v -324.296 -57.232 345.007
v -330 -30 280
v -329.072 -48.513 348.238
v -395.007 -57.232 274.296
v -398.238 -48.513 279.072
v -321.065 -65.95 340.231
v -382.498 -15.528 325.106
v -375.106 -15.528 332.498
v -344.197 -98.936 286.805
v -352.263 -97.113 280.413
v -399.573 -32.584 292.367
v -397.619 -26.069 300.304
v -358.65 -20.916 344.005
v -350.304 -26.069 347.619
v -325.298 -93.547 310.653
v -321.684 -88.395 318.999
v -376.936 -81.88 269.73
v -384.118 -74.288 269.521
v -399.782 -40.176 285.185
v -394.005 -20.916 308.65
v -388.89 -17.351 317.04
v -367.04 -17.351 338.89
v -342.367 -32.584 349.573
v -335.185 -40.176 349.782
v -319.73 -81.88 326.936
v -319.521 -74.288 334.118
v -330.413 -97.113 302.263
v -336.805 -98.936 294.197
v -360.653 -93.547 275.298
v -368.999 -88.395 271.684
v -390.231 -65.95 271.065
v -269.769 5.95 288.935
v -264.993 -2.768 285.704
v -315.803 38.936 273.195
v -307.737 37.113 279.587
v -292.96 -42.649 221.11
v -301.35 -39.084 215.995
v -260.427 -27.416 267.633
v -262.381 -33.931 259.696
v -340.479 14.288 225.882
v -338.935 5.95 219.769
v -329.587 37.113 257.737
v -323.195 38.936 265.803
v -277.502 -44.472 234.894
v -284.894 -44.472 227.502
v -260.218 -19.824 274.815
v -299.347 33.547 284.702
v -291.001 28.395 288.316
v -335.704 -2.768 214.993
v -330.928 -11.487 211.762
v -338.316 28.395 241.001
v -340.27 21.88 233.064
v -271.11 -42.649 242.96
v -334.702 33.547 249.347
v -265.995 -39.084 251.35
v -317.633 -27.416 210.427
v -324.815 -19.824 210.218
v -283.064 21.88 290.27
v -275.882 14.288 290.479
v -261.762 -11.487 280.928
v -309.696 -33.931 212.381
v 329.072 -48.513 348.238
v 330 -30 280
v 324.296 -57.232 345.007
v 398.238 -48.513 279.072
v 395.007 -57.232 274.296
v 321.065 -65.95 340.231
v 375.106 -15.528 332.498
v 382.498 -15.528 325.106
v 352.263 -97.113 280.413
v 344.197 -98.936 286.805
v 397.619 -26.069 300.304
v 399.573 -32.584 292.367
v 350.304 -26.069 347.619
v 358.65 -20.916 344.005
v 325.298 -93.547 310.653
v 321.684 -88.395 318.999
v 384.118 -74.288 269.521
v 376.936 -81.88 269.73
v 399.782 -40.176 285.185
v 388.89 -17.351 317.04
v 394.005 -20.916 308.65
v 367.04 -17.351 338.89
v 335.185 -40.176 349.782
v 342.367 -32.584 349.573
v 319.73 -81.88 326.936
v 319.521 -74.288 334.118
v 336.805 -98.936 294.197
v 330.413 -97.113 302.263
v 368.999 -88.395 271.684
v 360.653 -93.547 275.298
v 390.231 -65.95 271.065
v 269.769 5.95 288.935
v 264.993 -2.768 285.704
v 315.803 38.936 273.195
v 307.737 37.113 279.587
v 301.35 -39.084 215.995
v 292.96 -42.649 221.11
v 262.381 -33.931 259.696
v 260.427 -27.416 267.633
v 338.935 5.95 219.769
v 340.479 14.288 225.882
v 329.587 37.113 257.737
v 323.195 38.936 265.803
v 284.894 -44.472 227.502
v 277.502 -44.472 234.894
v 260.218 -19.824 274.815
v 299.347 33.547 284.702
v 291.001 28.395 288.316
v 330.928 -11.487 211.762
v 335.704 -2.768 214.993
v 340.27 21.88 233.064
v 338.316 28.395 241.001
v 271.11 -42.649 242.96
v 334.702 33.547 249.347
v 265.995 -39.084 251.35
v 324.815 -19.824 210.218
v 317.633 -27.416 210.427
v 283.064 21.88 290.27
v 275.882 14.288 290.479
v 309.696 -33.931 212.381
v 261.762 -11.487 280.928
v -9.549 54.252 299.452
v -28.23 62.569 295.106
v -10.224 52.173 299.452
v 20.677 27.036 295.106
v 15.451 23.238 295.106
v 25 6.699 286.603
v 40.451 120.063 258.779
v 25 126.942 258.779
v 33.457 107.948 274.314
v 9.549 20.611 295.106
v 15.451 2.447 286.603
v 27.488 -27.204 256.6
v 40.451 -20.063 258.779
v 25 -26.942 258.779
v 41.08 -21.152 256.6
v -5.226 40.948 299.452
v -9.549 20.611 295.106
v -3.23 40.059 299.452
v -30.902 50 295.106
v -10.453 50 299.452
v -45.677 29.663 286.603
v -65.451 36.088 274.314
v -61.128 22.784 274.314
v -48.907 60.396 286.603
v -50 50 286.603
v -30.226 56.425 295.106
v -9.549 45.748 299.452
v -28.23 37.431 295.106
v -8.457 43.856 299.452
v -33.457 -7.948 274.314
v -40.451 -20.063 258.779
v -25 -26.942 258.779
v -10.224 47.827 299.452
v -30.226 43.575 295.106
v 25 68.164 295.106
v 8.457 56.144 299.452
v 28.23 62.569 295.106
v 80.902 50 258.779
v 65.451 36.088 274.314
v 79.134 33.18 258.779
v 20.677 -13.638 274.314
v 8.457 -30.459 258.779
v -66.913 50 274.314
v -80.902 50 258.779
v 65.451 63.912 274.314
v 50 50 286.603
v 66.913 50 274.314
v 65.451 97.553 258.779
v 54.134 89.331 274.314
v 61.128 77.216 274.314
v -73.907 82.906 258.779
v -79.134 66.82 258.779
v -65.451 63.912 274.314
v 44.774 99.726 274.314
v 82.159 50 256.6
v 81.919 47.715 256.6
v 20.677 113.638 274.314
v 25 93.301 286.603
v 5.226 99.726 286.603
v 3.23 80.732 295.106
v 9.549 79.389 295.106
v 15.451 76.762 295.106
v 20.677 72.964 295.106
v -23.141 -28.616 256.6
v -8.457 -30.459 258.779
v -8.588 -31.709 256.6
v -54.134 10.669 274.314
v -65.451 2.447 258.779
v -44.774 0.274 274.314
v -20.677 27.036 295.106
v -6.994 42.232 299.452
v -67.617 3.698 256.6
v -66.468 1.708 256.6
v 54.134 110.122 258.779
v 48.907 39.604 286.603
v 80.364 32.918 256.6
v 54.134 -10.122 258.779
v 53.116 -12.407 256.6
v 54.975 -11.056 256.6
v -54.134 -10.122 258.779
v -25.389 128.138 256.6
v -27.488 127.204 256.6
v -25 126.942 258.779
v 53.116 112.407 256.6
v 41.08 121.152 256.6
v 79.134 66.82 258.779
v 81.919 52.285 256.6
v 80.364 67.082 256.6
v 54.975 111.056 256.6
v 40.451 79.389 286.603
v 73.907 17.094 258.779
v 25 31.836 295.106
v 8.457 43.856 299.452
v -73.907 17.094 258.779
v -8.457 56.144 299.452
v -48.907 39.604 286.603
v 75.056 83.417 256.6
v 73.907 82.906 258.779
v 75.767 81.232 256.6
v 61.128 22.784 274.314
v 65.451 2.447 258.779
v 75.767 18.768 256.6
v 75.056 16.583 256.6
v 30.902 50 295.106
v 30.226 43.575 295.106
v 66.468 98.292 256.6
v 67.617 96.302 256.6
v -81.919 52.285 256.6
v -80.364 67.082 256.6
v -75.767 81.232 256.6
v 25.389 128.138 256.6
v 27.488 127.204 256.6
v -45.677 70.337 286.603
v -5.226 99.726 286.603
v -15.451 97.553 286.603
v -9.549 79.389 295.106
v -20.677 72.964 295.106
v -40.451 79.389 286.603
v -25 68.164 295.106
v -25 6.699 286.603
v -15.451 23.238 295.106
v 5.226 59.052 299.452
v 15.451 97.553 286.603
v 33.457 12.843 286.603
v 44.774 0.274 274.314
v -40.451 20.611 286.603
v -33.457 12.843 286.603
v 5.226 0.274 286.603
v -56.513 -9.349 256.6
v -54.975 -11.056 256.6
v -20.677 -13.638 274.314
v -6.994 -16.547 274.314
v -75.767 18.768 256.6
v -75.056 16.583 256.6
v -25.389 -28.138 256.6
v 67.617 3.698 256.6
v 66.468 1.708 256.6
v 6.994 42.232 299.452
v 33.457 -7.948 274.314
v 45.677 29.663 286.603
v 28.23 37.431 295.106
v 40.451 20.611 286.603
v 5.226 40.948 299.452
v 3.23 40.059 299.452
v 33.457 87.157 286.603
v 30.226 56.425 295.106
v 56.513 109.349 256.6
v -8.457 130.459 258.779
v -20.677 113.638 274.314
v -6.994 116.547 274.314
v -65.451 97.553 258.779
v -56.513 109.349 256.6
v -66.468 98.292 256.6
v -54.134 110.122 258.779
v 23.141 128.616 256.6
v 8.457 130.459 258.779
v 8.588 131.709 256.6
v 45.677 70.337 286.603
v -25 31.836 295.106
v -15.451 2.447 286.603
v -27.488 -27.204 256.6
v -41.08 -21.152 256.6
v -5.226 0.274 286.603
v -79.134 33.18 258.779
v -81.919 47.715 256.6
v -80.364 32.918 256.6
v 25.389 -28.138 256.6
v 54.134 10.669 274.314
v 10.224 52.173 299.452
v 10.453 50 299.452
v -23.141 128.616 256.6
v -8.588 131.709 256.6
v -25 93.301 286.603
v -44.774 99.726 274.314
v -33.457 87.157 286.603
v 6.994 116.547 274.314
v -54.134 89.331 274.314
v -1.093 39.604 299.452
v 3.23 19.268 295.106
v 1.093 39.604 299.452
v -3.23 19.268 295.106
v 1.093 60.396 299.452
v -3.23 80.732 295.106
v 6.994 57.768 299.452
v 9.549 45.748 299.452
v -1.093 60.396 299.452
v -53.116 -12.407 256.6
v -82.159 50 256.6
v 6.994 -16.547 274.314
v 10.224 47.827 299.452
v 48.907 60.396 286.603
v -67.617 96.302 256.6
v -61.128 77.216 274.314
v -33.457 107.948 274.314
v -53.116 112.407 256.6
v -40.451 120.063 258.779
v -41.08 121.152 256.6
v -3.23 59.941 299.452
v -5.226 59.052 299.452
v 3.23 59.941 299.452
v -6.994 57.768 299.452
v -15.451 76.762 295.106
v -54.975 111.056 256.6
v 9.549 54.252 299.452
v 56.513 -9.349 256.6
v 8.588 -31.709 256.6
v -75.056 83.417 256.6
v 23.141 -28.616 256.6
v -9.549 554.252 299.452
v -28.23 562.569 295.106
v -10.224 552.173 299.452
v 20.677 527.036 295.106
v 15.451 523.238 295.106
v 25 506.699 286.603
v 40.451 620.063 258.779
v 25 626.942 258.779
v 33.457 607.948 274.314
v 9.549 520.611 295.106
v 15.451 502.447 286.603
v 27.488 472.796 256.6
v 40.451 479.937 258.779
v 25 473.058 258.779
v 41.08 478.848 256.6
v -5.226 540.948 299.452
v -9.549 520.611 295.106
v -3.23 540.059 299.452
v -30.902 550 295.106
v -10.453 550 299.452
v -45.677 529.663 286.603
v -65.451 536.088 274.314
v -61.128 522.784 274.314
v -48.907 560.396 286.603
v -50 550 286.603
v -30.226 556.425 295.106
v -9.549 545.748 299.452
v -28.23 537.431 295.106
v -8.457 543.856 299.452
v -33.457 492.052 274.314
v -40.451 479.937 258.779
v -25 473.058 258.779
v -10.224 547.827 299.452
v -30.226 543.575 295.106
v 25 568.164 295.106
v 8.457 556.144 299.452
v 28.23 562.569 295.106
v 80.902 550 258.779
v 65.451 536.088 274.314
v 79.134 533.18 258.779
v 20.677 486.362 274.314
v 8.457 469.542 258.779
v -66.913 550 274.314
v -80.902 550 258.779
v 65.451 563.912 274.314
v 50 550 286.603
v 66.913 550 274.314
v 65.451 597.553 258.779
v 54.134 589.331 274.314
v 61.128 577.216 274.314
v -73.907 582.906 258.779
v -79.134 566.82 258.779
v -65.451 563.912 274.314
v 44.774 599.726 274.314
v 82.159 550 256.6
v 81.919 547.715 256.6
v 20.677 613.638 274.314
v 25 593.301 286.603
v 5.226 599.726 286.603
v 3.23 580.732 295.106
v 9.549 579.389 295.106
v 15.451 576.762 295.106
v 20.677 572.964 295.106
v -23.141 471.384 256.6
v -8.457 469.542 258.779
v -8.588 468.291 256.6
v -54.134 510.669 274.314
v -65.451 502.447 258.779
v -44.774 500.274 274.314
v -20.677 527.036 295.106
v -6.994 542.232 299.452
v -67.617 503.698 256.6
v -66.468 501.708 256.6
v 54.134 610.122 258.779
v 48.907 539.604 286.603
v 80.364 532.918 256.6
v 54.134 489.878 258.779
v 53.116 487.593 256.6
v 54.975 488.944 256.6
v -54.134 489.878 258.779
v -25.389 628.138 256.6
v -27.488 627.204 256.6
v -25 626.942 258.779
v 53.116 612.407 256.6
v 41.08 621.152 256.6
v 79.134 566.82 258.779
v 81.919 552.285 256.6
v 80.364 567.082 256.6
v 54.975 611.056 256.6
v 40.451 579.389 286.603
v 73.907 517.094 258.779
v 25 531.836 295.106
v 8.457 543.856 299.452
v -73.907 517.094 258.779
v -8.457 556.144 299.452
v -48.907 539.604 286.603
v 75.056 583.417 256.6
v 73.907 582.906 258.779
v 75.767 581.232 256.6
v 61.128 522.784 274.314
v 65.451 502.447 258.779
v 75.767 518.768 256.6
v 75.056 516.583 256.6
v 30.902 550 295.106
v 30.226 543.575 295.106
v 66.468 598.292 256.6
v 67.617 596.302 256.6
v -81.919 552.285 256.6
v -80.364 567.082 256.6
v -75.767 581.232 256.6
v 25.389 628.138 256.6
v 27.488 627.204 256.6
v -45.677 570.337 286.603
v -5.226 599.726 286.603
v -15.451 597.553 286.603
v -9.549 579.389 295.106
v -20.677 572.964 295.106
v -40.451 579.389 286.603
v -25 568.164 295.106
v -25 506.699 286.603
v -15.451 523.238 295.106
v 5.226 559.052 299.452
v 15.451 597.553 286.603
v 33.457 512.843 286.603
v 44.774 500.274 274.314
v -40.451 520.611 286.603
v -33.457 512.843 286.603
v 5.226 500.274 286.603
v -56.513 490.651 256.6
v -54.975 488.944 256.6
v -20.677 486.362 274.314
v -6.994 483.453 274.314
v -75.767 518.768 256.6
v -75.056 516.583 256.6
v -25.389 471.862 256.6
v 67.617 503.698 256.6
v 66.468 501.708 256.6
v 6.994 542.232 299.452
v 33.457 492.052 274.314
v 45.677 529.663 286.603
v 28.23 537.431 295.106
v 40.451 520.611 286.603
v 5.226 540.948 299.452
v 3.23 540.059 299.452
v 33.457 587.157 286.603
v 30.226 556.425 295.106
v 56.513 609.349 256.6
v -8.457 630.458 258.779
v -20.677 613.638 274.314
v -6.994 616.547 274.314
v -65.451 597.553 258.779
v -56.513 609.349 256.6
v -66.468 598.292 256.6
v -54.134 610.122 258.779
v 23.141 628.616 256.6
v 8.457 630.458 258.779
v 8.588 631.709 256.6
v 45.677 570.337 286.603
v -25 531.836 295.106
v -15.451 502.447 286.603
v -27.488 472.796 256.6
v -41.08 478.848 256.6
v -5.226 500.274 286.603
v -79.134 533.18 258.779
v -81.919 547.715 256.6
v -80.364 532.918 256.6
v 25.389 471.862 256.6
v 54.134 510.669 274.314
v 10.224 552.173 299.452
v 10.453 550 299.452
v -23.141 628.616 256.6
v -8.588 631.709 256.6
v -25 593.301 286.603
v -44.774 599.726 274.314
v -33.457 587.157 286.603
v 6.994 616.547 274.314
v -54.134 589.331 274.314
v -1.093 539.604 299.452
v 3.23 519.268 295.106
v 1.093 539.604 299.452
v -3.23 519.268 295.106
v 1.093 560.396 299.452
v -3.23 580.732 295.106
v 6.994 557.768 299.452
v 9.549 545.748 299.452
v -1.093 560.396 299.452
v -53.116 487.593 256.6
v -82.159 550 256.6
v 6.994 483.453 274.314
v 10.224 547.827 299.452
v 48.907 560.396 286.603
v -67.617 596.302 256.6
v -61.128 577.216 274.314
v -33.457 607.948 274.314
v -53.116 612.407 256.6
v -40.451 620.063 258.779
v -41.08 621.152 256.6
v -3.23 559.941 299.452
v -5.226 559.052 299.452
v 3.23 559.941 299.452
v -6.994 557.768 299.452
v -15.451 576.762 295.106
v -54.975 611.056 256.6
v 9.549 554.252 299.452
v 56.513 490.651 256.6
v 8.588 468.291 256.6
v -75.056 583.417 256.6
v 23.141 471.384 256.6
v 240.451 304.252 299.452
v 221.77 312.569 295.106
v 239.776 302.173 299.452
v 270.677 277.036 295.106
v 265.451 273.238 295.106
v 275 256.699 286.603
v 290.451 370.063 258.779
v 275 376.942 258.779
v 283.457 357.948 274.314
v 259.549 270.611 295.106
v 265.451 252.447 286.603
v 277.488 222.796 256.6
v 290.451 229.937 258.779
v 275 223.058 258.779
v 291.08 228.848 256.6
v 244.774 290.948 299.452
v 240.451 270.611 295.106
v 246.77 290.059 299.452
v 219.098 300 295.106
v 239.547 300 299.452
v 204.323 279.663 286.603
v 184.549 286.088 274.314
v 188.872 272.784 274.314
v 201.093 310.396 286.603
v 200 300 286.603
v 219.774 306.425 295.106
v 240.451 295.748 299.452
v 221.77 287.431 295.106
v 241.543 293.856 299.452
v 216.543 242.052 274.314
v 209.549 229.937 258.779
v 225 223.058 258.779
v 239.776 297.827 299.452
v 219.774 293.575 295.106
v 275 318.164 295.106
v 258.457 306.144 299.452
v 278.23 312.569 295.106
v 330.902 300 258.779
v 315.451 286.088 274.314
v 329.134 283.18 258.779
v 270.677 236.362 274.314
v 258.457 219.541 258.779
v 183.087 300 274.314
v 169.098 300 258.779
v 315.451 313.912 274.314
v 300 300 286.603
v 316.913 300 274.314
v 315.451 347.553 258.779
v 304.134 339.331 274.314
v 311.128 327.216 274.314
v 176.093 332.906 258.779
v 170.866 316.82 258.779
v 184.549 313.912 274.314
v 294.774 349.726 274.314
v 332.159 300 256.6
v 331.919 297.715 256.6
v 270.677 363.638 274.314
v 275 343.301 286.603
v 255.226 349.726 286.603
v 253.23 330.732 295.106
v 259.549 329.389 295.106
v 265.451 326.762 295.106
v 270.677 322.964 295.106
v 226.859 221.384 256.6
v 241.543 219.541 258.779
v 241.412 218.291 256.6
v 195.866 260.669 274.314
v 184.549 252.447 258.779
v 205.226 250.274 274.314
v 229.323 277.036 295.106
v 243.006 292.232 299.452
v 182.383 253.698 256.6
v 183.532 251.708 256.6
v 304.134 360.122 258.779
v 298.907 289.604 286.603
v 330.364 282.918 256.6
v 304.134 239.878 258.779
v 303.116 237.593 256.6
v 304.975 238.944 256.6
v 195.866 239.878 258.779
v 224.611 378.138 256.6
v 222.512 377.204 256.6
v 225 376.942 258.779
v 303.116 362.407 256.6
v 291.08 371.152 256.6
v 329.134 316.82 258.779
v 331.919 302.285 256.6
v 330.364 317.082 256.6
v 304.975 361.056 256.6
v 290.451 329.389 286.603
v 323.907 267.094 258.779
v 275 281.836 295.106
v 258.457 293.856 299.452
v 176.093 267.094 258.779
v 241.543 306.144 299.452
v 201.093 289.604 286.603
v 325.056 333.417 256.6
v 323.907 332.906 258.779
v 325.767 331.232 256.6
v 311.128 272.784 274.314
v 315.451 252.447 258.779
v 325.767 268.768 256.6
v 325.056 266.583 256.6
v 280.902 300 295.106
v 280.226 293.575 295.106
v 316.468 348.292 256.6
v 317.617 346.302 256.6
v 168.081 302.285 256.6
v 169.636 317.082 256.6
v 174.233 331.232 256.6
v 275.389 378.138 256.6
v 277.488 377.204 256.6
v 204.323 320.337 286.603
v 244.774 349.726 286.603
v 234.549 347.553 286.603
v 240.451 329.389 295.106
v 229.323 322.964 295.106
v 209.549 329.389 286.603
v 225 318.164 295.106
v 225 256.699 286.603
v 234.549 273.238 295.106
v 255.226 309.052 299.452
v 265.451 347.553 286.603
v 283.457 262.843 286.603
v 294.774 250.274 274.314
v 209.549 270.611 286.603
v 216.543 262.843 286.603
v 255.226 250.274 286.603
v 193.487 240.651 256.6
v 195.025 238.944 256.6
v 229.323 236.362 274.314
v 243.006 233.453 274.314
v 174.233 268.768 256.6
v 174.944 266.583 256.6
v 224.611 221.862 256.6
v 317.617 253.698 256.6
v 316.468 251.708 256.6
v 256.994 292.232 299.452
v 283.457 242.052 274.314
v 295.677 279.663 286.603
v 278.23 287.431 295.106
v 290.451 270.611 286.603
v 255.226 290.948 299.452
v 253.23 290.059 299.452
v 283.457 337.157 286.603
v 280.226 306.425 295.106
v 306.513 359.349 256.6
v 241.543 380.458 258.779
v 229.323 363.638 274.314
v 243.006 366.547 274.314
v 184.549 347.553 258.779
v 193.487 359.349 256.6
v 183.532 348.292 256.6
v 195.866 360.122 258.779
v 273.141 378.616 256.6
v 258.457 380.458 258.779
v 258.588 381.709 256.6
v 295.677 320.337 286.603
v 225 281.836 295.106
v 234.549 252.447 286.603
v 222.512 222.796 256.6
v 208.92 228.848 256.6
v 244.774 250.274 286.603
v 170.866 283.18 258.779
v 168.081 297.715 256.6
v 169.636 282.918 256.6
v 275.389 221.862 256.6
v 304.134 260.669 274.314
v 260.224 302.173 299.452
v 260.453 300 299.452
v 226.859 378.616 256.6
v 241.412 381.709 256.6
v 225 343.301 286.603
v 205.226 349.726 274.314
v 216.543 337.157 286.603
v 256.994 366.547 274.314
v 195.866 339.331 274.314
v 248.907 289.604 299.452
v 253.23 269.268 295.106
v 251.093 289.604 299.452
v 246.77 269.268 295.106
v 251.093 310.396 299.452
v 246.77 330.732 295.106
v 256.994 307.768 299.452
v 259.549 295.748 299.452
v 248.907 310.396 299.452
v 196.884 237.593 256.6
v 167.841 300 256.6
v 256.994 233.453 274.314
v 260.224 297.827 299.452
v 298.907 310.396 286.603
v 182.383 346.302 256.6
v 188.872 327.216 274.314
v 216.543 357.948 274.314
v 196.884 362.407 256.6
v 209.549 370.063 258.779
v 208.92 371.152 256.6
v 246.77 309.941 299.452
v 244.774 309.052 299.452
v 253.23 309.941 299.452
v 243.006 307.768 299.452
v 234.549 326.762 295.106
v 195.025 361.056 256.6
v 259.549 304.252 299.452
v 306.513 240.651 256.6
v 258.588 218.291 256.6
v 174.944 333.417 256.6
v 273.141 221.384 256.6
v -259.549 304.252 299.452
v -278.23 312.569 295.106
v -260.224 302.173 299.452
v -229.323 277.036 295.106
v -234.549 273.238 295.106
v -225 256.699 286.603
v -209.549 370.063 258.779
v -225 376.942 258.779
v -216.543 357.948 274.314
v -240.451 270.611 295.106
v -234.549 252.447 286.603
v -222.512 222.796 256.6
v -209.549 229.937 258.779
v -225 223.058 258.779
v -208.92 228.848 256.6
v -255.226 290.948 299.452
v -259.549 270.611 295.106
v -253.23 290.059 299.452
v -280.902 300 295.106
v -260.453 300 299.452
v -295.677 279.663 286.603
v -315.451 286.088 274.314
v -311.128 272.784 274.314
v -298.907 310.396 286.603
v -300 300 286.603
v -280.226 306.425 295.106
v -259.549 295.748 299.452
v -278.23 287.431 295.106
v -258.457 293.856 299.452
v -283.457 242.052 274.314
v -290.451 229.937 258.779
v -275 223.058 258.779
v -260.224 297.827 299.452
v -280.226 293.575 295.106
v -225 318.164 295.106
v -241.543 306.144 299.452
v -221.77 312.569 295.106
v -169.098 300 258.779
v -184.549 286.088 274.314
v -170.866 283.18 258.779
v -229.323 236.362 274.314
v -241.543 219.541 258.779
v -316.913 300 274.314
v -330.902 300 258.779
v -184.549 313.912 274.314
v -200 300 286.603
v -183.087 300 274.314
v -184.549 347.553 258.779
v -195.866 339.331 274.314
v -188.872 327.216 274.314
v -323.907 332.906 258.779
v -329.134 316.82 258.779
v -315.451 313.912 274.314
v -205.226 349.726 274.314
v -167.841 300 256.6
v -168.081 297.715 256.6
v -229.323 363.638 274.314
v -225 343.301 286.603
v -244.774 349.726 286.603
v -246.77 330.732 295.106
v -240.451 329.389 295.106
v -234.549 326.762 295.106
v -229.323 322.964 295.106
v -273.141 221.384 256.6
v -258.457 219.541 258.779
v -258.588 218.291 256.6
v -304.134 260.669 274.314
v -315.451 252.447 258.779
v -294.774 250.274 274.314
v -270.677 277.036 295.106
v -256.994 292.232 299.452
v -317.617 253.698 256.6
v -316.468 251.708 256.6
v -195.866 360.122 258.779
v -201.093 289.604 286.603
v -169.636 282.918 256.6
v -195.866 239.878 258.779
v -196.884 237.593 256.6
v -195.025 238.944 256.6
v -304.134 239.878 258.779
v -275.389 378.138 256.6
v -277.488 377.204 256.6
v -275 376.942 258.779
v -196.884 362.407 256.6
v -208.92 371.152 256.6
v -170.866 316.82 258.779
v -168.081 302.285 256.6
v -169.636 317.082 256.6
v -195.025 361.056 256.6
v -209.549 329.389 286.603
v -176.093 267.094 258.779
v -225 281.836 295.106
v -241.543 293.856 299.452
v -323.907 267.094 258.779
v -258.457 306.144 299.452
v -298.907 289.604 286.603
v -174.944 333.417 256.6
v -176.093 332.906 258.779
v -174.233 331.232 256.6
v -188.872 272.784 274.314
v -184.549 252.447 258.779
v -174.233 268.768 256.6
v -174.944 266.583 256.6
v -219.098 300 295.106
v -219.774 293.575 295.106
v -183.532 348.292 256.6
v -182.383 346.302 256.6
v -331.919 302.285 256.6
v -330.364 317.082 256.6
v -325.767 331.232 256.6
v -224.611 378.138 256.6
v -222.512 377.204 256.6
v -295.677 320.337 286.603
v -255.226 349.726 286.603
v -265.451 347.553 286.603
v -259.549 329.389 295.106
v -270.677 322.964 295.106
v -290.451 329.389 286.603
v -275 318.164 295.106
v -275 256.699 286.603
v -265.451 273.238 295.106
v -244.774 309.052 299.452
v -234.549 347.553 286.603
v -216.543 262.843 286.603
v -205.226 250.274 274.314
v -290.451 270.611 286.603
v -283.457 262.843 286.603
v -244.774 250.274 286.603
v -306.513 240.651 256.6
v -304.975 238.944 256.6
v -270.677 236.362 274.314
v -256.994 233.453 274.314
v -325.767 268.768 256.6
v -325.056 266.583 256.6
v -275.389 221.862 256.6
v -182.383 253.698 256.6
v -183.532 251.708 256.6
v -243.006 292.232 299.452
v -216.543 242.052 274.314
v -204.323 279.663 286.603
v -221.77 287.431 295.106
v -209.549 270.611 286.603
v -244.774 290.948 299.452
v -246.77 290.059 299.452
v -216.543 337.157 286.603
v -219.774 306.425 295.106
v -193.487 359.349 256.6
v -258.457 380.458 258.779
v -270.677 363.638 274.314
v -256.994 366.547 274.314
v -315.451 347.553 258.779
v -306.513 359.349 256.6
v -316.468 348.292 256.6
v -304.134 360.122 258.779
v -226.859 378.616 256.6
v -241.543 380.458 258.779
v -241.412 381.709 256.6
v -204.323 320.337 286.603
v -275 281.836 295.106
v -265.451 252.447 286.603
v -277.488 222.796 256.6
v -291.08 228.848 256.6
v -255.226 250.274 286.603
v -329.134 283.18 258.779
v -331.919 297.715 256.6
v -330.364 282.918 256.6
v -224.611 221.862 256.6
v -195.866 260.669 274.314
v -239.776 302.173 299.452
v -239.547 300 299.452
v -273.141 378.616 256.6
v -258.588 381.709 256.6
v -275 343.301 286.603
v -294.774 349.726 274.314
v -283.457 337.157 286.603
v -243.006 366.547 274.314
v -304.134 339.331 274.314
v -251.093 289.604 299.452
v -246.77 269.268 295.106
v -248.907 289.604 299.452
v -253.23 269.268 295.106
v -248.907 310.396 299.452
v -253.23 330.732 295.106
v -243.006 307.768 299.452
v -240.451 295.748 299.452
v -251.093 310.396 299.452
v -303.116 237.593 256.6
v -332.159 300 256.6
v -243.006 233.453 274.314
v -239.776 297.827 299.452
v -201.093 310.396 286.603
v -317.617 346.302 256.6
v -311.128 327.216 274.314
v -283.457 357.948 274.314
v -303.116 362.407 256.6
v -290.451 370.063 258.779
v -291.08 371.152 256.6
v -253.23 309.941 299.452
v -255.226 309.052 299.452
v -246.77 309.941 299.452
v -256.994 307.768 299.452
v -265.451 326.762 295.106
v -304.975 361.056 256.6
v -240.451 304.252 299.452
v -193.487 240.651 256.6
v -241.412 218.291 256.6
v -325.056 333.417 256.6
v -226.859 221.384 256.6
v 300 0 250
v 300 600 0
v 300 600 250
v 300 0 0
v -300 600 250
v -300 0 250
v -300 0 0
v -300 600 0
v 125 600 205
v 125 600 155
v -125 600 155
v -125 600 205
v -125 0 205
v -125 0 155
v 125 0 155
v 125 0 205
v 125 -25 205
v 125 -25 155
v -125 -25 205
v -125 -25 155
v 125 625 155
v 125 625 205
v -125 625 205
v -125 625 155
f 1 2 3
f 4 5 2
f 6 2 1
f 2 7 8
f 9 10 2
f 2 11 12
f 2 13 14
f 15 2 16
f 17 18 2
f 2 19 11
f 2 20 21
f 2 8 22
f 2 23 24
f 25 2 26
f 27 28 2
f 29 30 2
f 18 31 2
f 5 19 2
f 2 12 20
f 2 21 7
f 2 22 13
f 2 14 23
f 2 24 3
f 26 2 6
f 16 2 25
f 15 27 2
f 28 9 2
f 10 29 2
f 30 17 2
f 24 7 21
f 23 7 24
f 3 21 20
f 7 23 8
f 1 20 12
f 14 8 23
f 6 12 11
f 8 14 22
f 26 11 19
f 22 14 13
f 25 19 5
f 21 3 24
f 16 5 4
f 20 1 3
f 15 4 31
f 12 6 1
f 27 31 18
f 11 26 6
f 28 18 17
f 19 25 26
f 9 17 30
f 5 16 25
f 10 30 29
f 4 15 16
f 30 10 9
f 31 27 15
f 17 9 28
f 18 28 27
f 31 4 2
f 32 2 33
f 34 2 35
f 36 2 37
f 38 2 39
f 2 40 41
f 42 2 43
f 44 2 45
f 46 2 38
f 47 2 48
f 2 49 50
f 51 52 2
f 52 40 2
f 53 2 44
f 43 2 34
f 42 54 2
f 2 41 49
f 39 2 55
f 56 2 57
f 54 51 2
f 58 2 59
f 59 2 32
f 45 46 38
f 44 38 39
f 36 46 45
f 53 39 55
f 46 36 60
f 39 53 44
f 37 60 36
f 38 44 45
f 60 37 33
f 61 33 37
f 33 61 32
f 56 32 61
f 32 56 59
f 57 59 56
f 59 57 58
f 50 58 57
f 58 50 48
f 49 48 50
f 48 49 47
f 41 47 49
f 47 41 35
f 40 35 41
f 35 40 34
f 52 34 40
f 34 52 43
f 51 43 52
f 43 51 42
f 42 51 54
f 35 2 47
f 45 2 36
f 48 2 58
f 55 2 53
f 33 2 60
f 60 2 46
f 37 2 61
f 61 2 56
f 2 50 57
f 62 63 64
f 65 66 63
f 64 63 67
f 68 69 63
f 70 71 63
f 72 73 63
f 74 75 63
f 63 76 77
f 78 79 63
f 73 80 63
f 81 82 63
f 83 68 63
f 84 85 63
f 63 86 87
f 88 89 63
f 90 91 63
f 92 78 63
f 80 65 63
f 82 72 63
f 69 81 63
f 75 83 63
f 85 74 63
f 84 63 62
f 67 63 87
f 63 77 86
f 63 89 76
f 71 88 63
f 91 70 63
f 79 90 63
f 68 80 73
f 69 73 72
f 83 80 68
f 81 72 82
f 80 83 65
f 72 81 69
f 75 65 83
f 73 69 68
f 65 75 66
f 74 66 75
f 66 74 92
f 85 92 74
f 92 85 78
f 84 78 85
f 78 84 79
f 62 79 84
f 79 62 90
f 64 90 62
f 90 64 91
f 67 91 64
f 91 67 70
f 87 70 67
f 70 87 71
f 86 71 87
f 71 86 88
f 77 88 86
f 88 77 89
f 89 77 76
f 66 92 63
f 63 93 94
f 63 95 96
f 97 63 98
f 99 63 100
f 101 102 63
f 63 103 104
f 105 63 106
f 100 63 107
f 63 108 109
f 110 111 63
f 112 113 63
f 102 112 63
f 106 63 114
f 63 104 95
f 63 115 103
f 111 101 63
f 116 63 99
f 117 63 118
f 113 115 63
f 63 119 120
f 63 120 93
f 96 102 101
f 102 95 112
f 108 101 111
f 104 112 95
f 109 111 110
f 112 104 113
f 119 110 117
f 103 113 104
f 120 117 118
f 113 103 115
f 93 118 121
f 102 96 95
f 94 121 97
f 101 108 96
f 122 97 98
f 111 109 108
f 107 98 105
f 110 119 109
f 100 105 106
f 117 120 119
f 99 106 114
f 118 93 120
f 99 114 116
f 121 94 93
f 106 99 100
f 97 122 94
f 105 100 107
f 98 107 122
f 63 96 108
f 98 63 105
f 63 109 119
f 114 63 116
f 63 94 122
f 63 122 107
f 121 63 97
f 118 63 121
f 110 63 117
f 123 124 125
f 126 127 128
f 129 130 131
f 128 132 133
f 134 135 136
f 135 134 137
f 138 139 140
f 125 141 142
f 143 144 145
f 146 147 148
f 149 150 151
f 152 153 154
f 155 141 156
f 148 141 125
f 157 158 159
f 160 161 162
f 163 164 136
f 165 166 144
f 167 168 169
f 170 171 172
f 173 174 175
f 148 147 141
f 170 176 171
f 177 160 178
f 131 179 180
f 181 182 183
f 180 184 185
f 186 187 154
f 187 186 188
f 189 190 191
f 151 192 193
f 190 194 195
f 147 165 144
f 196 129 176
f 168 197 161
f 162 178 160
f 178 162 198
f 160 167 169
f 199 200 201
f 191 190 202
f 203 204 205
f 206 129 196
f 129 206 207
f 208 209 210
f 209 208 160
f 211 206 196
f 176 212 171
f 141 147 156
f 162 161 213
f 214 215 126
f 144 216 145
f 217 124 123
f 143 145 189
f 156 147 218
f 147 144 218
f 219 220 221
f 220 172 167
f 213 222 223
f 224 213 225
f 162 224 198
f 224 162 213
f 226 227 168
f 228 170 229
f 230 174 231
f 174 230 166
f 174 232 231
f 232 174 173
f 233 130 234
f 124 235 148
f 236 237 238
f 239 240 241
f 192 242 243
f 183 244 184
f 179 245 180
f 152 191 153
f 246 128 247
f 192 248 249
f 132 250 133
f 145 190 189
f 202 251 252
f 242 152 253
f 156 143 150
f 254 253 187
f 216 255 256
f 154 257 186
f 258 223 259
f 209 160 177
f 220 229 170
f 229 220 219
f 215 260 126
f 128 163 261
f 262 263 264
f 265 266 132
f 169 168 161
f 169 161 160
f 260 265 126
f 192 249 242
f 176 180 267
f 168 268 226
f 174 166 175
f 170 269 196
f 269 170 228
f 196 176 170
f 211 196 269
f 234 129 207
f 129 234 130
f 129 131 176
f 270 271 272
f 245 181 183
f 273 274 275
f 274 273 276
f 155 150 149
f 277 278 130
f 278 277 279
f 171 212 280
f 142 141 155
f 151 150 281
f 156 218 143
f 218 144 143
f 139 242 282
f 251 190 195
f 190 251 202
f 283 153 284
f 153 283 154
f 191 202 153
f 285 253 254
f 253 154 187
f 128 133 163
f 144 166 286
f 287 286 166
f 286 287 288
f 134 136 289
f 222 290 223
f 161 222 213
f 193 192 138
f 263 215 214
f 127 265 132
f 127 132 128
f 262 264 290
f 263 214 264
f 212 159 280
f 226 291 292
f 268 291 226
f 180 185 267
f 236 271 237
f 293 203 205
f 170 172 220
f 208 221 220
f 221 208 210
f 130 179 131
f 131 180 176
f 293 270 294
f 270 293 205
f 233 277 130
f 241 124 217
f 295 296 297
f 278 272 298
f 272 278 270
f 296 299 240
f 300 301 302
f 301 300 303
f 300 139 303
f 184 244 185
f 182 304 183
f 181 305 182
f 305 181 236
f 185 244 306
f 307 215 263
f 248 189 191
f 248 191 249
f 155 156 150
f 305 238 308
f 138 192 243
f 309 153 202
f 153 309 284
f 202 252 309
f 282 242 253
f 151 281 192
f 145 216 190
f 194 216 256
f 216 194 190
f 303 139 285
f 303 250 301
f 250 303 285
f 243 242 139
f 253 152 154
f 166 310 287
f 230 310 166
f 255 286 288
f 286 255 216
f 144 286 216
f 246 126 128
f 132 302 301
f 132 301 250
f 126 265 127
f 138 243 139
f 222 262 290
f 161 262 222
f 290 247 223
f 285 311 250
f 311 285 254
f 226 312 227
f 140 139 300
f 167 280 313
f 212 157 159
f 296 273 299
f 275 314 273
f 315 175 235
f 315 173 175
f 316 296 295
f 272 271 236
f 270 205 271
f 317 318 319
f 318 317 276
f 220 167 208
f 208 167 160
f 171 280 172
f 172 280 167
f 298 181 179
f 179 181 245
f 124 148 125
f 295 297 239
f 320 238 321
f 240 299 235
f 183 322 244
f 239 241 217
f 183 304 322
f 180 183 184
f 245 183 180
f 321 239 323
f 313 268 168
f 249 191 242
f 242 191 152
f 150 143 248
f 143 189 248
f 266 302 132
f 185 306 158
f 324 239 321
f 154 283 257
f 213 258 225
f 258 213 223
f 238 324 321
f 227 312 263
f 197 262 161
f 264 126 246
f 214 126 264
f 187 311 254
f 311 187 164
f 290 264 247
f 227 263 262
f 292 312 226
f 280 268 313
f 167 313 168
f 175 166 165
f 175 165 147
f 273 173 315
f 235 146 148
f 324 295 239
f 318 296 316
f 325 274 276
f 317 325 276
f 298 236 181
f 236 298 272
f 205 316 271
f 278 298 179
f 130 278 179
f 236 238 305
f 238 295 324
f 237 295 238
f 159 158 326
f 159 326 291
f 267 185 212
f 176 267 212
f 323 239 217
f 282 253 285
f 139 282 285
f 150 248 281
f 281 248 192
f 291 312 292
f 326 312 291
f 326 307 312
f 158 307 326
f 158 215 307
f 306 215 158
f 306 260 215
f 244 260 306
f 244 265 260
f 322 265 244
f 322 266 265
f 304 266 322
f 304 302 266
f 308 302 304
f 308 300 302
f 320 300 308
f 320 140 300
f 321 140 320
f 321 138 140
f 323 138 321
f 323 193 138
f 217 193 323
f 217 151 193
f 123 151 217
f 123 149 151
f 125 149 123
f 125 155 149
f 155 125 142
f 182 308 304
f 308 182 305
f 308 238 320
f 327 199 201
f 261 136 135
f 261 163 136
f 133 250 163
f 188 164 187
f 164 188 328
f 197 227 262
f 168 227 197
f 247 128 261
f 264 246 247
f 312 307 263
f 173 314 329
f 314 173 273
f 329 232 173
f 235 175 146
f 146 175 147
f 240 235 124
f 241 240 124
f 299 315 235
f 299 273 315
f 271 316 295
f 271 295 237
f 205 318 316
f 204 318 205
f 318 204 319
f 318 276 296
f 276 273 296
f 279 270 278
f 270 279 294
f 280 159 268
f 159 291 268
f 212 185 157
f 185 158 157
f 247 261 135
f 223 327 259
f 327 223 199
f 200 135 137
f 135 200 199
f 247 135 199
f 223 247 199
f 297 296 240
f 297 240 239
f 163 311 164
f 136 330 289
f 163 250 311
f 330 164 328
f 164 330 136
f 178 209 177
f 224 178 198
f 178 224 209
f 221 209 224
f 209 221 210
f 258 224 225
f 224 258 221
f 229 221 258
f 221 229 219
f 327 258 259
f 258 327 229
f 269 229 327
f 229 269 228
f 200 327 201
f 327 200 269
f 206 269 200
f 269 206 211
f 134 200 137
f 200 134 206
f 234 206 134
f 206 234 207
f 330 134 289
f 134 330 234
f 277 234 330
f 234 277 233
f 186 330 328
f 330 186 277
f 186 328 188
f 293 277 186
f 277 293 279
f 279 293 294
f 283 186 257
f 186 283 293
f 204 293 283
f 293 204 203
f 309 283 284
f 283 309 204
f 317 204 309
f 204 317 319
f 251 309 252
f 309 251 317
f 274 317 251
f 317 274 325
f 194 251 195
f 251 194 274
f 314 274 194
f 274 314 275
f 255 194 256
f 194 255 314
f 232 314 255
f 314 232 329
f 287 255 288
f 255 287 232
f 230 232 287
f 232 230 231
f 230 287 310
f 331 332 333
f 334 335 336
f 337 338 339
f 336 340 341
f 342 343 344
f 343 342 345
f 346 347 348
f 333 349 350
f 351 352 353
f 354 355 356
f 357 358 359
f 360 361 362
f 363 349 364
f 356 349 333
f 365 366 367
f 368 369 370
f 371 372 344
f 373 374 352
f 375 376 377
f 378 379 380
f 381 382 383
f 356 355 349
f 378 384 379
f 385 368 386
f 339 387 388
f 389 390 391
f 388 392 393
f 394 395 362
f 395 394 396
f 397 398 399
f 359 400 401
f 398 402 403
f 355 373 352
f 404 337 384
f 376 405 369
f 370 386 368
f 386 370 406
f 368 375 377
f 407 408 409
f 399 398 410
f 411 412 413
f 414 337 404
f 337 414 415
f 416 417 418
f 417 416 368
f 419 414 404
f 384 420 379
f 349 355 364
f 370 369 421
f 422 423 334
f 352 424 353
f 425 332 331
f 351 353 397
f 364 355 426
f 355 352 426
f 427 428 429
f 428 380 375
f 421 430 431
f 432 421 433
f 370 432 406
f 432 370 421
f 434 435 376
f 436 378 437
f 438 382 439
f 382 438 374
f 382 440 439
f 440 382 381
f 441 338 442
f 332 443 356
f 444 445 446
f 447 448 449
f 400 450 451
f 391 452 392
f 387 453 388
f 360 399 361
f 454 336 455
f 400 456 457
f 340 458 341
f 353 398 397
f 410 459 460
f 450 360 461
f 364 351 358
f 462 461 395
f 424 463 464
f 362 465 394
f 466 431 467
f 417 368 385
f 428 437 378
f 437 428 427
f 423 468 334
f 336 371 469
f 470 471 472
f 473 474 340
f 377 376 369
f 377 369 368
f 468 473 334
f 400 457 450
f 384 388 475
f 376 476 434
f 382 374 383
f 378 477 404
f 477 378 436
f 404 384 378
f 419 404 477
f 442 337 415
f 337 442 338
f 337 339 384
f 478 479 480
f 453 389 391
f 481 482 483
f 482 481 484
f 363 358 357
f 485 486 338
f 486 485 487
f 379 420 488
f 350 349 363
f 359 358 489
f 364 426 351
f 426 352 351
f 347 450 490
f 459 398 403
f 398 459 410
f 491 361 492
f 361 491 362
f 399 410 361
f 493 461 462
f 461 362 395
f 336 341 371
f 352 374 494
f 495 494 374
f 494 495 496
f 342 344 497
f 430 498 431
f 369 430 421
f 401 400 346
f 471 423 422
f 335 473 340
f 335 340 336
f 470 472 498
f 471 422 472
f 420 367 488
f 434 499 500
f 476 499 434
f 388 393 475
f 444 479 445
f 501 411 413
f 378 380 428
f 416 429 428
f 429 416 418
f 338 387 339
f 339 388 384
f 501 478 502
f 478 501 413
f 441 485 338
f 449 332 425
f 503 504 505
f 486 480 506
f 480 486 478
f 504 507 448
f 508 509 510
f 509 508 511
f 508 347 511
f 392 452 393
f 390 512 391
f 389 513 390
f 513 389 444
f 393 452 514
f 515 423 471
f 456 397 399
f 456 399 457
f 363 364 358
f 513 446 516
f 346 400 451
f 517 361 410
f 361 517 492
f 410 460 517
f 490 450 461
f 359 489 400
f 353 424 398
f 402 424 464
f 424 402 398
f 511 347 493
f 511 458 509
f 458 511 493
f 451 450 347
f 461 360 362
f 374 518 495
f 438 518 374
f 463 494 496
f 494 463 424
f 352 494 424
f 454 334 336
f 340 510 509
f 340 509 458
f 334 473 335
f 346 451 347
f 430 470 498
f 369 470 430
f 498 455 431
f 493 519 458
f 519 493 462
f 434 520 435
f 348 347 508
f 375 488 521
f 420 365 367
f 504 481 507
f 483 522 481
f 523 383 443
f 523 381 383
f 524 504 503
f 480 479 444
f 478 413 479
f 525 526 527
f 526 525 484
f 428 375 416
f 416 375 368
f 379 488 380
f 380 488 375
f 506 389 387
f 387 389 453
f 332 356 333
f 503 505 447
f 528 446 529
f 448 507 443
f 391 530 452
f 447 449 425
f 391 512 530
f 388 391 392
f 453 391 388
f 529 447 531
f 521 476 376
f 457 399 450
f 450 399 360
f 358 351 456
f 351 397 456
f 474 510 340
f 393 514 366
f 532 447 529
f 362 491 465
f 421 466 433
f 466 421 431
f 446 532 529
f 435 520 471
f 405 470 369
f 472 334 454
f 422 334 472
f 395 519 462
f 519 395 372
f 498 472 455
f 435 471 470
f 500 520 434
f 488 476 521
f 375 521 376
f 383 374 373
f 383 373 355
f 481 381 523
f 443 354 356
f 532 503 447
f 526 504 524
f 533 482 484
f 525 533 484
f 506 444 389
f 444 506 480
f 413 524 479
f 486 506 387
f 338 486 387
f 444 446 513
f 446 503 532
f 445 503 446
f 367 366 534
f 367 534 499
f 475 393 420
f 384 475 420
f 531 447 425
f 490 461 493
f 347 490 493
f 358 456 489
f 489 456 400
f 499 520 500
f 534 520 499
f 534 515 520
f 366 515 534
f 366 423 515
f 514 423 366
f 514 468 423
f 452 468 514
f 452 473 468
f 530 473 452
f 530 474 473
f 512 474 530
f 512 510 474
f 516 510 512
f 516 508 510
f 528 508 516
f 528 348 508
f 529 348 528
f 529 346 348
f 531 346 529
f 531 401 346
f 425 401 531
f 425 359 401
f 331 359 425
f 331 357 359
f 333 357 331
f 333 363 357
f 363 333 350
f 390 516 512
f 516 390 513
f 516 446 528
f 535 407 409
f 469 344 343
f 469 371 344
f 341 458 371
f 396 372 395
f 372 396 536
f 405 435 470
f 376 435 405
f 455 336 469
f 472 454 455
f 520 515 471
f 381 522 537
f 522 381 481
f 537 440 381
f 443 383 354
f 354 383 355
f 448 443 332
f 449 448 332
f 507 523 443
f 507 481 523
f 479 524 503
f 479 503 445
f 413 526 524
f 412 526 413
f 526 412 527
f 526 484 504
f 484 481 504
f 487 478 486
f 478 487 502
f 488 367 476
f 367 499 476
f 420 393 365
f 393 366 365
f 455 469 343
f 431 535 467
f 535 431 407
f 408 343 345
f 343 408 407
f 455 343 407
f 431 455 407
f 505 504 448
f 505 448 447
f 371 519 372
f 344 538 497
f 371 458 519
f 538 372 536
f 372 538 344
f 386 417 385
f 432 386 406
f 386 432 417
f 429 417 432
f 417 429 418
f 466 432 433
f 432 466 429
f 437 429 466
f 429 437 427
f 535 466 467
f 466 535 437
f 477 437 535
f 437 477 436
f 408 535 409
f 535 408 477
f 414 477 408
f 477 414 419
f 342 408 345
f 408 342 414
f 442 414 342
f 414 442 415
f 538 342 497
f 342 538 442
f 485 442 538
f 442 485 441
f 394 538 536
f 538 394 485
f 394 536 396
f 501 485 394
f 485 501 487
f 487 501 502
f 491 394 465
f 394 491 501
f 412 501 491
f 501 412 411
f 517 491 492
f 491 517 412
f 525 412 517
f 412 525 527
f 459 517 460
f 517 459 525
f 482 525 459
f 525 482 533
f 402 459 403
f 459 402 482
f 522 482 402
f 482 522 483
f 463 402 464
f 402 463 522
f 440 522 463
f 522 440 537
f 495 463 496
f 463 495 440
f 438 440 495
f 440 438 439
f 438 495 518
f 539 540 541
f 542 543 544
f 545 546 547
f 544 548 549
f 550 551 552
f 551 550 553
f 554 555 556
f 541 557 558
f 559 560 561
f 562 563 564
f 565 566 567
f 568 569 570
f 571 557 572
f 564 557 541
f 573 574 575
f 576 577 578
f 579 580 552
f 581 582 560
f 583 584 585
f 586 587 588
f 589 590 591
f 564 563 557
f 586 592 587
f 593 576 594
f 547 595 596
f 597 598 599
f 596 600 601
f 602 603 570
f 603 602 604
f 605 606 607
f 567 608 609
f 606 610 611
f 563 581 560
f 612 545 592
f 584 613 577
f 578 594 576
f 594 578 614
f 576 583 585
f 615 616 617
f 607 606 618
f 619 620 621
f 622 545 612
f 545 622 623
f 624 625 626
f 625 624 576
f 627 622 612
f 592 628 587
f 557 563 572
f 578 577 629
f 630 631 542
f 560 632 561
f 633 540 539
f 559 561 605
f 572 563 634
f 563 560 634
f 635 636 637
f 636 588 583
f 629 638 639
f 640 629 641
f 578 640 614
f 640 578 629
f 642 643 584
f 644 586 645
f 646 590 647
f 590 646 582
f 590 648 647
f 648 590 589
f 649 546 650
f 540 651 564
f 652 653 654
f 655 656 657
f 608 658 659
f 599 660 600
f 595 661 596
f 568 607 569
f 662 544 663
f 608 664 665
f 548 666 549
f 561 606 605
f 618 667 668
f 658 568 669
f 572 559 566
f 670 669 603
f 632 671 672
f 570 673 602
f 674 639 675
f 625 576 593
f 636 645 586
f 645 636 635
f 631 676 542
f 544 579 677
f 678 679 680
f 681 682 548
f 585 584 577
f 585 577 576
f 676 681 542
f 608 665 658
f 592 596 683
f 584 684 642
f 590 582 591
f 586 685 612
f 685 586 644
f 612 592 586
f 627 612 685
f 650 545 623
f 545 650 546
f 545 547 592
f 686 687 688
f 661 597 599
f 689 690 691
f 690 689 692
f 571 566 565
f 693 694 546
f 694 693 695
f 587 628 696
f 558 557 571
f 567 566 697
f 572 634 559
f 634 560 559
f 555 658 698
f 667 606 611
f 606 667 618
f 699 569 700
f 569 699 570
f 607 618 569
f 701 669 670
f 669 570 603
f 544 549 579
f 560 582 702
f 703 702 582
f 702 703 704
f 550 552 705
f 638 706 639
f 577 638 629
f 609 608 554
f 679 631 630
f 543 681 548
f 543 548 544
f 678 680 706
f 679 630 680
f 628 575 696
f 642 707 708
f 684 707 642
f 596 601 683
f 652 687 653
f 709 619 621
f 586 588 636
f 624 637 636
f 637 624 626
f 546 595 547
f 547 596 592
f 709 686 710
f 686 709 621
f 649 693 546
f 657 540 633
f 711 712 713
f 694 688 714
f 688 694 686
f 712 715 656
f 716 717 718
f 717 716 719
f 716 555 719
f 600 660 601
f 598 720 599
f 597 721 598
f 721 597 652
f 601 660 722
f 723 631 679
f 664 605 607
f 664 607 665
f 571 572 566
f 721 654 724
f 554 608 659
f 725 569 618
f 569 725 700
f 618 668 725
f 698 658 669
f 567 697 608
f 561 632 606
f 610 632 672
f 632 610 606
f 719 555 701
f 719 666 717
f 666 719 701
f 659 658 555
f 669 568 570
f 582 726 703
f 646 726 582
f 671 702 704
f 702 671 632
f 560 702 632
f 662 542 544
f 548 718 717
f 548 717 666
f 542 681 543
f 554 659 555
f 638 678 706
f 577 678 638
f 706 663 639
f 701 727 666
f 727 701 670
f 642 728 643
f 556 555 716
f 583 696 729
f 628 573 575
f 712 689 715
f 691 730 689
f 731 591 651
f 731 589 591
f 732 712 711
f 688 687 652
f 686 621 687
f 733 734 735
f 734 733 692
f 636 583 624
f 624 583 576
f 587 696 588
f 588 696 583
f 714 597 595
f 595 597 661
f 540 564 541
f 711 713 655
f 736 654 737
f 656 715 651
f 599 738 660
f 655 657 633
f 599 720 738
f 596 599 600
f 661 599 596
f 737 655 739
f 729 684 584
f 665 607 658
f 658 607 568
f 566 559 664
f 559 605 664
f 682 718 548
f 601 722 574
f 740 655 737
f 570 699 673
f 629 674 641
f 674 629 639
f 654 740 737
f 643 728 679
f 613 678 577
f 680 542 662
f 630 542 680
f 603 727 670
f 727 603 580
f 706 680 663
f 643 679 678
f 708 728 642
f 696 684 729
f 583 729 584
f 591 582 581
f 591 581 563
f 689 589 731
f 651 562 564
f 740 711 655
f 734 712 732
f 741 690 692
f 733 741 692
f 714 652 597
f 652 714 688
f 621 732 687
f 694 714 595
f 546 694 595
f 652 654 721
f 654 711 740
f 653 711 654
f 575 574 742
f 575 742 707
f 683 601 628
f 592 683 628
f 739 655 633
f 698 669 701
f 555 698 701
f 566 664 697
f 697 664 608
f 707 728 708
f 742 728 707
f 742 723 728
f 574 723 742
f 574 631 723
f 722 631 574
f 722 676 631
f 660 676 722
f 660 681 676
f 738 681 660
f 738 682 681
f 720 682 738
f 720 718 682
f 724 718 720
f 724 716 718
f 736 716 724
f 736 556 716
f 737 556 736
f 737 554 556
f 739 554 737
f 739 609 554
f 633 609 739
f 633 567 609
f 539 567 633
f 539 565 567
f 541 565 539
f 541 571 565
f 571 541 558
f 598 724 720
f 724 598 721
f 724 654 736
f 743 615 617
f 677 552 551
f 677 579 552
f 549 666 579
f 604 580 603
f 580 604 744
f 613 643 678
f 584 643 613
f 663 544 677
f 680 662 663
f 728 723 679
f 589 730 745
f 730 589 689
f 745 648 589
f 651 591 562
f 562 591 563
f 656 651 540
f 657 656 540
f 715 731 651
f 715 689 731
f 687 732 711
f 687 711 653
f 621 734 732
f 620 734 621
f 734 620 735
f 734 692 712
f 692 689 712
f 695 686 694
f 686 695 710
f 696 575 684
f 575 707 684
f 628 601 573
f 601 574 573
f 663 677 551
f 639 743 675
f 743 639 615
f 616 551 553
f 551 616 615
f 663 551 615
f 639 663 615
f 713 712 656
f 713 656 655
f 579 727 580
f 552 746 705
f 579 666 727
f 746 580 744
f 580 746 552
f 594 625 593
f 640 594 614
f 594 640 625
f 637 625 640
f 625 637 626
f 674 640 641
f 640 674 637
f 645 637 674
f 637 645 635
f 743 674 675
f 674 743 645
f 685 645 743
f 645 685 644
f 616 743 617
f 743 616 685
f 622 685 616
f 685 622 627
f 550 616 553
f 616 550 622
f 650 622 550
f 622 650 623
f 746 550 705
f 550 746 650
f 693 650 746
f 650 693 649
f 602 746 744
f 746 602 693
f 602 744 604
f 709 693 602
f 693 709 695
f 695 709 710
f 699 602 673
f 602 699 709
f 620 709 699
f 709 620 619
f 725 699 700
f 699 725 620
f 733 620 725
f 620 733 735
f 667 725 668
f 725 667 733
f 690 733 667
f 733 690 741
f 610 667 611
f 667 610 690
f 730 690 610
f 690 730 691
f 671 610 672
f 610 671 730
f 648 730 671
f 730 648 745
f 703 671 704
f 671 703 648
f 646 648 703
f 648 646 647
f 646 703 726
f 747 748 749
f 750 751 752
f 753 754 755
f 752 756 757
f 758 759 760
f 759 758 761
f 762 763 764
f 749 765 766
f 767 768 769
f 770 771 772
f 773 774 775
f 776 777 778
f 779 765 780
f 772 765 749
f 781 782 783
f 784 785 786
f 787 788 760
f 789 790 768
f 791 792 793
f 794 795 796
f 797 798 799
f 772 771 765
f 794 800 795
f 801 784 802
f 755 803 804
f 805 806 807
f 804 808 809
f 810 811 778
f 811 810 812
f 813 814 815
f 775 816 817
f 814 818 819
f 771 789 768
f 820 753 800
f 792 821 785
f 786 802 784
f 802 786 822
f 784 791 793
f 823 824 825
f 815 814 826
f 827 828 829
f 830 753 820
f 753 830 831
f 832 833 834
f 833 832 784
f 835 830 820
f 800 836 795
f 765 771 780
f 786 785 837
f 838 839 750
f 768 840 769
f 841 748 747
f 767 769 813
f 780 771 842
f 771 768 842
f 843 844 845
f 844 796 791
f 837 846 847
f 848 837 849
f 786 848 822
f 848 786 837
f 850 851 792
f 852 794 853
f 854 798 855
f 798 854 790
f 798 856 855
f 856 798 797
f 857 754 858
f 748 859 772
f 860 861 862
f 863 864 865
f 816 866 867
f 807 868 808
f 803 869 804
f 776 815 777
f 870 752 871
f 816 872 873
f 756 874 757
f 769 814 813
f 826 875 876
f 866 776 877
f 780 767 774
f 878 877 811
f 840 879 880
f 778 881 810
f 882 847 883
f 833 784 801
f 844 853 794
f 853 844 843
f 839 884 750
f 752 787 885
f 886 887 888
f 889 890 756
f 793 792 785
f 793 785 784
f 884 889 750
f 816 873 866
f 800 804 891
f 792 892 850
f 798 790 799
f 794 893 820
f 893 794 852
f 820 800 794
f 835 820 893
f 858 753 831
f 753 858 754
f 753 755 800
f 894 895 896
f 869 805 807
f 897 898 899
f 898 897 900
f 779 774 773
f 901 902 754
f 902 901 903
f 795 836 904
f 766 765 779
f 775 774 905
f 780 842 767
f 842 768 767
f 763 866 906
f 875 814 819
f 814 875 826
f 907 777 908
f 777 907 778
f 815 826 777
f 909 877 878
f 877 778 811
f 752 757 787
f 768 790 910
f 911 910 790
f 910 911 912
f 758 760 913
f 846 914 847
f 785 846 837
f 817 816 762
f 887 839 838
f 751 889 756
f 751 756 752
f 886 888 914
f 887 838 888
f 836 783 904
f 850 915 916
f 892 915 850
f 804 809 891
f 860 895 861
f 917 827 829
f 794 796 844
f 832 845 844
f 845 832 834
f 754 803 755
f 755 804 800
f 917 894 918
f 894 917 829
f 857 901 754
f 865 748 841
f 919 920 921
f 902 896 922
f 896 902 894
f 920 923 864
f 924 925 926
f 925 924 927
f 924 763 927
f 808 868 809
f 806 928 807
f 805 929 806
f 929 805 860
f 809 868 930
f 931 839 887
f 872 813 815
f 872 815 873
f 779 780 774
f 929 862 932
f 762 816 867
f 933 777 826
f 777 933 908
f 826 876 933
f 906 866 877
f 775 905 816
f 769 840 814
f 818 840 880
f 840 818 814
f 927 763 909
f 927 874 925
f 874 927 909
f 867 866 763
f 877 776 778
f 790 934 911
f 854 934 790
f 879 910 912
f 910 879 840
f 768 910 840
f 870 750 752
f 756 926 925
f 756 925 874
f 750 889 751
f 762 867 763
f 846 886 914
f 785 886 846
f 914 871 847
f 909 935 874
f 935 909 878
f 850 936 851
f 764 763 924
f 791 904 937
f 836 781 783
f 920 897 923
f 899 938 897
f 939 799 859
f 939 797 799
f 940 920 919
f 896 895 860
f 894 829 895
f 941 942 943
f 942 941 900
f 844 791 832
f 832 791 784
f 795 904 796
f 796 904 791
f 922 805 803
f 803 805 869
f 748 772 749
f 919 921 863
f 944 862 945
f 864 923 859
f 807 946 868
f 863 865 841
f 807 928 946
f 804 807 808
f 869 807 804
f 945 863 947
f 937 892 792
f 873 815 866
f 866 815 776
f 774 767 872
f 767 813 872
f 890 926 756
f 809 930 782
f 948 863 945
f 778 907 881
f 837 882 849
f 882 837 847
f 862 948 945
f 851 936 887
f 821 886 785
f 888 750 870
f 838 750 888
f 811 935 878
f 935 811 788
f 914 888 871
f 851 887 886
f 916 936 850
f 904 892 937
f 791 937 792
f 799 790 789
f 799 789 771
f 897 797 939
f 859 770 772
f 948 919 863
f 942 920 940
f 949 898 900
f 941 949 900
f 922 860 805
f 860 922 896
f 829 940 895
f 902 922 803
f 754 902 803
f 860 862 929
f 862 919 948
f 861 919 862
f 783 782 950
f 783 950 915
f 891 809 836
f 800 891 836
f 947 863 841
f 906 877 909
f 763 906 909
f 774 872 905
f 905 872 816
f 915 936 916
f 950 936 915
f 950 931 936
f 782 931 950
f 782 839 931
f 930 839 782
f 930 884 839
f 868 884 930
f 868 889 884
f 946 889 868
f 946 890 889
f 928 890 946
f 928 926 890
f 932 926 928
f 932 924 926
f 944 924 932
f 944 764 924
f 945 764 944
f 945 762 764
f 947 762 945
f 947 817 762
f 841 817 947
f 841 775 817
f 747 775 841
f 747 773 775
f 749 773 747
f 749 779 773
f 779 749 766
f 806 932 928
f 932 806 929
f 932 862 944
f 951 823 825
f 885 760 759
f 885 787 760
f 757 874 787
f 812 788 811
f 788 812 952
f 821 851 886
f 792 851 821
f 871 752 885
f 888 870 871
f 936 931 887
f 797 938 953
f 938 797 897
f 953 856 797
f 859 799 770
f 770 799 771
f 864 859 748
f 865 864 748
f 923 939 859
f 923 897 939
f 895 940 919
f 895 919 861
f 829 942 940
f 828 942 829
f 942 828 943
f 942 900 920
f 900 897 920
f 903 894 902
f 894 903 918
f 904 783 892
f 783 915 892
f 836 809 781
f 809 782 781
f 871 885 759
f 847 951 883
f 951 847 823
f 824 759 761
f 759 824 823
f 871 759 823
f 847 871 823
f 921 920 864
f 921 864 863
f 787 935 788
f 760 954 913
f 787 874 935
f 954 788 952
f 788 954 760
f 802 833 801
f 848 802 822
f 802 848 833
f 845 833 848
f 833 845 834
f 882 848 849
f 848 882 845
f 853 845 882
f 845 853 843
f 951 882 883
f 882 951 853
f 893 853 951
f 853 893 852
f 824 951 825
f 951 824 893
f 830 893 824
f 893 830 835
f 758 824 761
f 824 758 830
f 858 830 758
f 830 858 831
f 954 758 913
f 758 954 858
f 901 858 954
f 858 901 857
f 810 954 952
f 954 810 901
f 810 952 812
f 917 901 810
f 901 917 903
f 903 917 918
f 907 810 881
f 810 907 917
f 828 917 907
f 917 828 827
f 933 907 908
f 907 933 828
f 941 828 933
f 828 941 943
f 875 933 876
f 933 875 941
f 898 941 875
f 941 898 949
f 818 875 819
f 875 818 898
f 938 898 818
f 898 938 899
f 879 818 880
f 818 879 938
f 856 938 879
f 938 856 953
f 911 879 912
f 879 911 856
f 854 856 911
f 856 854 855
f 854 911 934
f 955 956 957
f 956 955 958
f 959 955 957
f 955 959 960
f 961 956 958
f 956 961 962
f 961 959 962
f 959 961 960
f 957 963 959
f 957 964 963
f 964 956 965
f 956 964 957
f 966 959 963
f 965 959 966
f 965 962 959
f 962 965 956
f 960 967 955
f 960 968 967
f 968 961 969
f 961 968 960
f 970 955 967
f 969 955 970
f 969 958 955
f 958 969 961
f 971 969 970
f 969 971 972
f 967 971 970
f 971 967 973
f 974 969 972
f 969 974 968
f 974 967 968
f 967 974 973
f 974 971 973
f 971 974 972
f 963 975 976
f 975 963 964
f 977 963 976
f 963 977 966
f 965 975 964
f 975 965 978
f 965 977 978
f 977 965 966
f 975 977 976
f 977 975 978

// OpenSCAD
head_vyska = 250;



HeadModel();

module HeadModel() {

translate([-300,0,0]) {

    // bedna
    color("white")
    cube([600,600,head_vyska]);


    //lidar A
    translate([-30,-30,head_vyska+30])
    rotate([33,-45,0])
    lidar();


    //lidar B
    translate([600,0,0])
    mirror([1,0,0])
    translate([-30,-30,head_vyska+30])
    rotate([33,-45,0])
    lidar();


    //gnss anténa 1
    translate([300,50, head_vyska])
    GnssAntena();

    //gnss anténa 2
    translate([300,600-50, head_vyska])
    GnssAntena();

    //gnss anténa 3
    translate([600-50, 300, head_vyska])
    GnssAntena();

    //gnss anténa 4
    translate([50,300, head_vyska])
    GnssAntena();


    //kamera přední
    translate([300,0,head_vyska-70])
    camera();


    //kamera zadní
    translate([300,600,head_vyska-70])
    camera();


}

}




module GnssAntena() {
    
    // 456-33-VSP6037L-58
color("lightgreen") {
    translate([0, 0, -100+50]) 
    difference() {
        sphere(r=100);
        translate([-100,-100,-100-43.4])
        cube([200,200,200]);
        
    }
}


}


module lidar() {

color("orange") {
   
    cylinder(h =50, d1=0, d2=100);
    mirror([0,0,1])
    cylinder(h =50, d1=0, d2=100);
}

}



module camera() {

color("DodgerBlue") {

    cube([250,50,50], center=true);
}


}
